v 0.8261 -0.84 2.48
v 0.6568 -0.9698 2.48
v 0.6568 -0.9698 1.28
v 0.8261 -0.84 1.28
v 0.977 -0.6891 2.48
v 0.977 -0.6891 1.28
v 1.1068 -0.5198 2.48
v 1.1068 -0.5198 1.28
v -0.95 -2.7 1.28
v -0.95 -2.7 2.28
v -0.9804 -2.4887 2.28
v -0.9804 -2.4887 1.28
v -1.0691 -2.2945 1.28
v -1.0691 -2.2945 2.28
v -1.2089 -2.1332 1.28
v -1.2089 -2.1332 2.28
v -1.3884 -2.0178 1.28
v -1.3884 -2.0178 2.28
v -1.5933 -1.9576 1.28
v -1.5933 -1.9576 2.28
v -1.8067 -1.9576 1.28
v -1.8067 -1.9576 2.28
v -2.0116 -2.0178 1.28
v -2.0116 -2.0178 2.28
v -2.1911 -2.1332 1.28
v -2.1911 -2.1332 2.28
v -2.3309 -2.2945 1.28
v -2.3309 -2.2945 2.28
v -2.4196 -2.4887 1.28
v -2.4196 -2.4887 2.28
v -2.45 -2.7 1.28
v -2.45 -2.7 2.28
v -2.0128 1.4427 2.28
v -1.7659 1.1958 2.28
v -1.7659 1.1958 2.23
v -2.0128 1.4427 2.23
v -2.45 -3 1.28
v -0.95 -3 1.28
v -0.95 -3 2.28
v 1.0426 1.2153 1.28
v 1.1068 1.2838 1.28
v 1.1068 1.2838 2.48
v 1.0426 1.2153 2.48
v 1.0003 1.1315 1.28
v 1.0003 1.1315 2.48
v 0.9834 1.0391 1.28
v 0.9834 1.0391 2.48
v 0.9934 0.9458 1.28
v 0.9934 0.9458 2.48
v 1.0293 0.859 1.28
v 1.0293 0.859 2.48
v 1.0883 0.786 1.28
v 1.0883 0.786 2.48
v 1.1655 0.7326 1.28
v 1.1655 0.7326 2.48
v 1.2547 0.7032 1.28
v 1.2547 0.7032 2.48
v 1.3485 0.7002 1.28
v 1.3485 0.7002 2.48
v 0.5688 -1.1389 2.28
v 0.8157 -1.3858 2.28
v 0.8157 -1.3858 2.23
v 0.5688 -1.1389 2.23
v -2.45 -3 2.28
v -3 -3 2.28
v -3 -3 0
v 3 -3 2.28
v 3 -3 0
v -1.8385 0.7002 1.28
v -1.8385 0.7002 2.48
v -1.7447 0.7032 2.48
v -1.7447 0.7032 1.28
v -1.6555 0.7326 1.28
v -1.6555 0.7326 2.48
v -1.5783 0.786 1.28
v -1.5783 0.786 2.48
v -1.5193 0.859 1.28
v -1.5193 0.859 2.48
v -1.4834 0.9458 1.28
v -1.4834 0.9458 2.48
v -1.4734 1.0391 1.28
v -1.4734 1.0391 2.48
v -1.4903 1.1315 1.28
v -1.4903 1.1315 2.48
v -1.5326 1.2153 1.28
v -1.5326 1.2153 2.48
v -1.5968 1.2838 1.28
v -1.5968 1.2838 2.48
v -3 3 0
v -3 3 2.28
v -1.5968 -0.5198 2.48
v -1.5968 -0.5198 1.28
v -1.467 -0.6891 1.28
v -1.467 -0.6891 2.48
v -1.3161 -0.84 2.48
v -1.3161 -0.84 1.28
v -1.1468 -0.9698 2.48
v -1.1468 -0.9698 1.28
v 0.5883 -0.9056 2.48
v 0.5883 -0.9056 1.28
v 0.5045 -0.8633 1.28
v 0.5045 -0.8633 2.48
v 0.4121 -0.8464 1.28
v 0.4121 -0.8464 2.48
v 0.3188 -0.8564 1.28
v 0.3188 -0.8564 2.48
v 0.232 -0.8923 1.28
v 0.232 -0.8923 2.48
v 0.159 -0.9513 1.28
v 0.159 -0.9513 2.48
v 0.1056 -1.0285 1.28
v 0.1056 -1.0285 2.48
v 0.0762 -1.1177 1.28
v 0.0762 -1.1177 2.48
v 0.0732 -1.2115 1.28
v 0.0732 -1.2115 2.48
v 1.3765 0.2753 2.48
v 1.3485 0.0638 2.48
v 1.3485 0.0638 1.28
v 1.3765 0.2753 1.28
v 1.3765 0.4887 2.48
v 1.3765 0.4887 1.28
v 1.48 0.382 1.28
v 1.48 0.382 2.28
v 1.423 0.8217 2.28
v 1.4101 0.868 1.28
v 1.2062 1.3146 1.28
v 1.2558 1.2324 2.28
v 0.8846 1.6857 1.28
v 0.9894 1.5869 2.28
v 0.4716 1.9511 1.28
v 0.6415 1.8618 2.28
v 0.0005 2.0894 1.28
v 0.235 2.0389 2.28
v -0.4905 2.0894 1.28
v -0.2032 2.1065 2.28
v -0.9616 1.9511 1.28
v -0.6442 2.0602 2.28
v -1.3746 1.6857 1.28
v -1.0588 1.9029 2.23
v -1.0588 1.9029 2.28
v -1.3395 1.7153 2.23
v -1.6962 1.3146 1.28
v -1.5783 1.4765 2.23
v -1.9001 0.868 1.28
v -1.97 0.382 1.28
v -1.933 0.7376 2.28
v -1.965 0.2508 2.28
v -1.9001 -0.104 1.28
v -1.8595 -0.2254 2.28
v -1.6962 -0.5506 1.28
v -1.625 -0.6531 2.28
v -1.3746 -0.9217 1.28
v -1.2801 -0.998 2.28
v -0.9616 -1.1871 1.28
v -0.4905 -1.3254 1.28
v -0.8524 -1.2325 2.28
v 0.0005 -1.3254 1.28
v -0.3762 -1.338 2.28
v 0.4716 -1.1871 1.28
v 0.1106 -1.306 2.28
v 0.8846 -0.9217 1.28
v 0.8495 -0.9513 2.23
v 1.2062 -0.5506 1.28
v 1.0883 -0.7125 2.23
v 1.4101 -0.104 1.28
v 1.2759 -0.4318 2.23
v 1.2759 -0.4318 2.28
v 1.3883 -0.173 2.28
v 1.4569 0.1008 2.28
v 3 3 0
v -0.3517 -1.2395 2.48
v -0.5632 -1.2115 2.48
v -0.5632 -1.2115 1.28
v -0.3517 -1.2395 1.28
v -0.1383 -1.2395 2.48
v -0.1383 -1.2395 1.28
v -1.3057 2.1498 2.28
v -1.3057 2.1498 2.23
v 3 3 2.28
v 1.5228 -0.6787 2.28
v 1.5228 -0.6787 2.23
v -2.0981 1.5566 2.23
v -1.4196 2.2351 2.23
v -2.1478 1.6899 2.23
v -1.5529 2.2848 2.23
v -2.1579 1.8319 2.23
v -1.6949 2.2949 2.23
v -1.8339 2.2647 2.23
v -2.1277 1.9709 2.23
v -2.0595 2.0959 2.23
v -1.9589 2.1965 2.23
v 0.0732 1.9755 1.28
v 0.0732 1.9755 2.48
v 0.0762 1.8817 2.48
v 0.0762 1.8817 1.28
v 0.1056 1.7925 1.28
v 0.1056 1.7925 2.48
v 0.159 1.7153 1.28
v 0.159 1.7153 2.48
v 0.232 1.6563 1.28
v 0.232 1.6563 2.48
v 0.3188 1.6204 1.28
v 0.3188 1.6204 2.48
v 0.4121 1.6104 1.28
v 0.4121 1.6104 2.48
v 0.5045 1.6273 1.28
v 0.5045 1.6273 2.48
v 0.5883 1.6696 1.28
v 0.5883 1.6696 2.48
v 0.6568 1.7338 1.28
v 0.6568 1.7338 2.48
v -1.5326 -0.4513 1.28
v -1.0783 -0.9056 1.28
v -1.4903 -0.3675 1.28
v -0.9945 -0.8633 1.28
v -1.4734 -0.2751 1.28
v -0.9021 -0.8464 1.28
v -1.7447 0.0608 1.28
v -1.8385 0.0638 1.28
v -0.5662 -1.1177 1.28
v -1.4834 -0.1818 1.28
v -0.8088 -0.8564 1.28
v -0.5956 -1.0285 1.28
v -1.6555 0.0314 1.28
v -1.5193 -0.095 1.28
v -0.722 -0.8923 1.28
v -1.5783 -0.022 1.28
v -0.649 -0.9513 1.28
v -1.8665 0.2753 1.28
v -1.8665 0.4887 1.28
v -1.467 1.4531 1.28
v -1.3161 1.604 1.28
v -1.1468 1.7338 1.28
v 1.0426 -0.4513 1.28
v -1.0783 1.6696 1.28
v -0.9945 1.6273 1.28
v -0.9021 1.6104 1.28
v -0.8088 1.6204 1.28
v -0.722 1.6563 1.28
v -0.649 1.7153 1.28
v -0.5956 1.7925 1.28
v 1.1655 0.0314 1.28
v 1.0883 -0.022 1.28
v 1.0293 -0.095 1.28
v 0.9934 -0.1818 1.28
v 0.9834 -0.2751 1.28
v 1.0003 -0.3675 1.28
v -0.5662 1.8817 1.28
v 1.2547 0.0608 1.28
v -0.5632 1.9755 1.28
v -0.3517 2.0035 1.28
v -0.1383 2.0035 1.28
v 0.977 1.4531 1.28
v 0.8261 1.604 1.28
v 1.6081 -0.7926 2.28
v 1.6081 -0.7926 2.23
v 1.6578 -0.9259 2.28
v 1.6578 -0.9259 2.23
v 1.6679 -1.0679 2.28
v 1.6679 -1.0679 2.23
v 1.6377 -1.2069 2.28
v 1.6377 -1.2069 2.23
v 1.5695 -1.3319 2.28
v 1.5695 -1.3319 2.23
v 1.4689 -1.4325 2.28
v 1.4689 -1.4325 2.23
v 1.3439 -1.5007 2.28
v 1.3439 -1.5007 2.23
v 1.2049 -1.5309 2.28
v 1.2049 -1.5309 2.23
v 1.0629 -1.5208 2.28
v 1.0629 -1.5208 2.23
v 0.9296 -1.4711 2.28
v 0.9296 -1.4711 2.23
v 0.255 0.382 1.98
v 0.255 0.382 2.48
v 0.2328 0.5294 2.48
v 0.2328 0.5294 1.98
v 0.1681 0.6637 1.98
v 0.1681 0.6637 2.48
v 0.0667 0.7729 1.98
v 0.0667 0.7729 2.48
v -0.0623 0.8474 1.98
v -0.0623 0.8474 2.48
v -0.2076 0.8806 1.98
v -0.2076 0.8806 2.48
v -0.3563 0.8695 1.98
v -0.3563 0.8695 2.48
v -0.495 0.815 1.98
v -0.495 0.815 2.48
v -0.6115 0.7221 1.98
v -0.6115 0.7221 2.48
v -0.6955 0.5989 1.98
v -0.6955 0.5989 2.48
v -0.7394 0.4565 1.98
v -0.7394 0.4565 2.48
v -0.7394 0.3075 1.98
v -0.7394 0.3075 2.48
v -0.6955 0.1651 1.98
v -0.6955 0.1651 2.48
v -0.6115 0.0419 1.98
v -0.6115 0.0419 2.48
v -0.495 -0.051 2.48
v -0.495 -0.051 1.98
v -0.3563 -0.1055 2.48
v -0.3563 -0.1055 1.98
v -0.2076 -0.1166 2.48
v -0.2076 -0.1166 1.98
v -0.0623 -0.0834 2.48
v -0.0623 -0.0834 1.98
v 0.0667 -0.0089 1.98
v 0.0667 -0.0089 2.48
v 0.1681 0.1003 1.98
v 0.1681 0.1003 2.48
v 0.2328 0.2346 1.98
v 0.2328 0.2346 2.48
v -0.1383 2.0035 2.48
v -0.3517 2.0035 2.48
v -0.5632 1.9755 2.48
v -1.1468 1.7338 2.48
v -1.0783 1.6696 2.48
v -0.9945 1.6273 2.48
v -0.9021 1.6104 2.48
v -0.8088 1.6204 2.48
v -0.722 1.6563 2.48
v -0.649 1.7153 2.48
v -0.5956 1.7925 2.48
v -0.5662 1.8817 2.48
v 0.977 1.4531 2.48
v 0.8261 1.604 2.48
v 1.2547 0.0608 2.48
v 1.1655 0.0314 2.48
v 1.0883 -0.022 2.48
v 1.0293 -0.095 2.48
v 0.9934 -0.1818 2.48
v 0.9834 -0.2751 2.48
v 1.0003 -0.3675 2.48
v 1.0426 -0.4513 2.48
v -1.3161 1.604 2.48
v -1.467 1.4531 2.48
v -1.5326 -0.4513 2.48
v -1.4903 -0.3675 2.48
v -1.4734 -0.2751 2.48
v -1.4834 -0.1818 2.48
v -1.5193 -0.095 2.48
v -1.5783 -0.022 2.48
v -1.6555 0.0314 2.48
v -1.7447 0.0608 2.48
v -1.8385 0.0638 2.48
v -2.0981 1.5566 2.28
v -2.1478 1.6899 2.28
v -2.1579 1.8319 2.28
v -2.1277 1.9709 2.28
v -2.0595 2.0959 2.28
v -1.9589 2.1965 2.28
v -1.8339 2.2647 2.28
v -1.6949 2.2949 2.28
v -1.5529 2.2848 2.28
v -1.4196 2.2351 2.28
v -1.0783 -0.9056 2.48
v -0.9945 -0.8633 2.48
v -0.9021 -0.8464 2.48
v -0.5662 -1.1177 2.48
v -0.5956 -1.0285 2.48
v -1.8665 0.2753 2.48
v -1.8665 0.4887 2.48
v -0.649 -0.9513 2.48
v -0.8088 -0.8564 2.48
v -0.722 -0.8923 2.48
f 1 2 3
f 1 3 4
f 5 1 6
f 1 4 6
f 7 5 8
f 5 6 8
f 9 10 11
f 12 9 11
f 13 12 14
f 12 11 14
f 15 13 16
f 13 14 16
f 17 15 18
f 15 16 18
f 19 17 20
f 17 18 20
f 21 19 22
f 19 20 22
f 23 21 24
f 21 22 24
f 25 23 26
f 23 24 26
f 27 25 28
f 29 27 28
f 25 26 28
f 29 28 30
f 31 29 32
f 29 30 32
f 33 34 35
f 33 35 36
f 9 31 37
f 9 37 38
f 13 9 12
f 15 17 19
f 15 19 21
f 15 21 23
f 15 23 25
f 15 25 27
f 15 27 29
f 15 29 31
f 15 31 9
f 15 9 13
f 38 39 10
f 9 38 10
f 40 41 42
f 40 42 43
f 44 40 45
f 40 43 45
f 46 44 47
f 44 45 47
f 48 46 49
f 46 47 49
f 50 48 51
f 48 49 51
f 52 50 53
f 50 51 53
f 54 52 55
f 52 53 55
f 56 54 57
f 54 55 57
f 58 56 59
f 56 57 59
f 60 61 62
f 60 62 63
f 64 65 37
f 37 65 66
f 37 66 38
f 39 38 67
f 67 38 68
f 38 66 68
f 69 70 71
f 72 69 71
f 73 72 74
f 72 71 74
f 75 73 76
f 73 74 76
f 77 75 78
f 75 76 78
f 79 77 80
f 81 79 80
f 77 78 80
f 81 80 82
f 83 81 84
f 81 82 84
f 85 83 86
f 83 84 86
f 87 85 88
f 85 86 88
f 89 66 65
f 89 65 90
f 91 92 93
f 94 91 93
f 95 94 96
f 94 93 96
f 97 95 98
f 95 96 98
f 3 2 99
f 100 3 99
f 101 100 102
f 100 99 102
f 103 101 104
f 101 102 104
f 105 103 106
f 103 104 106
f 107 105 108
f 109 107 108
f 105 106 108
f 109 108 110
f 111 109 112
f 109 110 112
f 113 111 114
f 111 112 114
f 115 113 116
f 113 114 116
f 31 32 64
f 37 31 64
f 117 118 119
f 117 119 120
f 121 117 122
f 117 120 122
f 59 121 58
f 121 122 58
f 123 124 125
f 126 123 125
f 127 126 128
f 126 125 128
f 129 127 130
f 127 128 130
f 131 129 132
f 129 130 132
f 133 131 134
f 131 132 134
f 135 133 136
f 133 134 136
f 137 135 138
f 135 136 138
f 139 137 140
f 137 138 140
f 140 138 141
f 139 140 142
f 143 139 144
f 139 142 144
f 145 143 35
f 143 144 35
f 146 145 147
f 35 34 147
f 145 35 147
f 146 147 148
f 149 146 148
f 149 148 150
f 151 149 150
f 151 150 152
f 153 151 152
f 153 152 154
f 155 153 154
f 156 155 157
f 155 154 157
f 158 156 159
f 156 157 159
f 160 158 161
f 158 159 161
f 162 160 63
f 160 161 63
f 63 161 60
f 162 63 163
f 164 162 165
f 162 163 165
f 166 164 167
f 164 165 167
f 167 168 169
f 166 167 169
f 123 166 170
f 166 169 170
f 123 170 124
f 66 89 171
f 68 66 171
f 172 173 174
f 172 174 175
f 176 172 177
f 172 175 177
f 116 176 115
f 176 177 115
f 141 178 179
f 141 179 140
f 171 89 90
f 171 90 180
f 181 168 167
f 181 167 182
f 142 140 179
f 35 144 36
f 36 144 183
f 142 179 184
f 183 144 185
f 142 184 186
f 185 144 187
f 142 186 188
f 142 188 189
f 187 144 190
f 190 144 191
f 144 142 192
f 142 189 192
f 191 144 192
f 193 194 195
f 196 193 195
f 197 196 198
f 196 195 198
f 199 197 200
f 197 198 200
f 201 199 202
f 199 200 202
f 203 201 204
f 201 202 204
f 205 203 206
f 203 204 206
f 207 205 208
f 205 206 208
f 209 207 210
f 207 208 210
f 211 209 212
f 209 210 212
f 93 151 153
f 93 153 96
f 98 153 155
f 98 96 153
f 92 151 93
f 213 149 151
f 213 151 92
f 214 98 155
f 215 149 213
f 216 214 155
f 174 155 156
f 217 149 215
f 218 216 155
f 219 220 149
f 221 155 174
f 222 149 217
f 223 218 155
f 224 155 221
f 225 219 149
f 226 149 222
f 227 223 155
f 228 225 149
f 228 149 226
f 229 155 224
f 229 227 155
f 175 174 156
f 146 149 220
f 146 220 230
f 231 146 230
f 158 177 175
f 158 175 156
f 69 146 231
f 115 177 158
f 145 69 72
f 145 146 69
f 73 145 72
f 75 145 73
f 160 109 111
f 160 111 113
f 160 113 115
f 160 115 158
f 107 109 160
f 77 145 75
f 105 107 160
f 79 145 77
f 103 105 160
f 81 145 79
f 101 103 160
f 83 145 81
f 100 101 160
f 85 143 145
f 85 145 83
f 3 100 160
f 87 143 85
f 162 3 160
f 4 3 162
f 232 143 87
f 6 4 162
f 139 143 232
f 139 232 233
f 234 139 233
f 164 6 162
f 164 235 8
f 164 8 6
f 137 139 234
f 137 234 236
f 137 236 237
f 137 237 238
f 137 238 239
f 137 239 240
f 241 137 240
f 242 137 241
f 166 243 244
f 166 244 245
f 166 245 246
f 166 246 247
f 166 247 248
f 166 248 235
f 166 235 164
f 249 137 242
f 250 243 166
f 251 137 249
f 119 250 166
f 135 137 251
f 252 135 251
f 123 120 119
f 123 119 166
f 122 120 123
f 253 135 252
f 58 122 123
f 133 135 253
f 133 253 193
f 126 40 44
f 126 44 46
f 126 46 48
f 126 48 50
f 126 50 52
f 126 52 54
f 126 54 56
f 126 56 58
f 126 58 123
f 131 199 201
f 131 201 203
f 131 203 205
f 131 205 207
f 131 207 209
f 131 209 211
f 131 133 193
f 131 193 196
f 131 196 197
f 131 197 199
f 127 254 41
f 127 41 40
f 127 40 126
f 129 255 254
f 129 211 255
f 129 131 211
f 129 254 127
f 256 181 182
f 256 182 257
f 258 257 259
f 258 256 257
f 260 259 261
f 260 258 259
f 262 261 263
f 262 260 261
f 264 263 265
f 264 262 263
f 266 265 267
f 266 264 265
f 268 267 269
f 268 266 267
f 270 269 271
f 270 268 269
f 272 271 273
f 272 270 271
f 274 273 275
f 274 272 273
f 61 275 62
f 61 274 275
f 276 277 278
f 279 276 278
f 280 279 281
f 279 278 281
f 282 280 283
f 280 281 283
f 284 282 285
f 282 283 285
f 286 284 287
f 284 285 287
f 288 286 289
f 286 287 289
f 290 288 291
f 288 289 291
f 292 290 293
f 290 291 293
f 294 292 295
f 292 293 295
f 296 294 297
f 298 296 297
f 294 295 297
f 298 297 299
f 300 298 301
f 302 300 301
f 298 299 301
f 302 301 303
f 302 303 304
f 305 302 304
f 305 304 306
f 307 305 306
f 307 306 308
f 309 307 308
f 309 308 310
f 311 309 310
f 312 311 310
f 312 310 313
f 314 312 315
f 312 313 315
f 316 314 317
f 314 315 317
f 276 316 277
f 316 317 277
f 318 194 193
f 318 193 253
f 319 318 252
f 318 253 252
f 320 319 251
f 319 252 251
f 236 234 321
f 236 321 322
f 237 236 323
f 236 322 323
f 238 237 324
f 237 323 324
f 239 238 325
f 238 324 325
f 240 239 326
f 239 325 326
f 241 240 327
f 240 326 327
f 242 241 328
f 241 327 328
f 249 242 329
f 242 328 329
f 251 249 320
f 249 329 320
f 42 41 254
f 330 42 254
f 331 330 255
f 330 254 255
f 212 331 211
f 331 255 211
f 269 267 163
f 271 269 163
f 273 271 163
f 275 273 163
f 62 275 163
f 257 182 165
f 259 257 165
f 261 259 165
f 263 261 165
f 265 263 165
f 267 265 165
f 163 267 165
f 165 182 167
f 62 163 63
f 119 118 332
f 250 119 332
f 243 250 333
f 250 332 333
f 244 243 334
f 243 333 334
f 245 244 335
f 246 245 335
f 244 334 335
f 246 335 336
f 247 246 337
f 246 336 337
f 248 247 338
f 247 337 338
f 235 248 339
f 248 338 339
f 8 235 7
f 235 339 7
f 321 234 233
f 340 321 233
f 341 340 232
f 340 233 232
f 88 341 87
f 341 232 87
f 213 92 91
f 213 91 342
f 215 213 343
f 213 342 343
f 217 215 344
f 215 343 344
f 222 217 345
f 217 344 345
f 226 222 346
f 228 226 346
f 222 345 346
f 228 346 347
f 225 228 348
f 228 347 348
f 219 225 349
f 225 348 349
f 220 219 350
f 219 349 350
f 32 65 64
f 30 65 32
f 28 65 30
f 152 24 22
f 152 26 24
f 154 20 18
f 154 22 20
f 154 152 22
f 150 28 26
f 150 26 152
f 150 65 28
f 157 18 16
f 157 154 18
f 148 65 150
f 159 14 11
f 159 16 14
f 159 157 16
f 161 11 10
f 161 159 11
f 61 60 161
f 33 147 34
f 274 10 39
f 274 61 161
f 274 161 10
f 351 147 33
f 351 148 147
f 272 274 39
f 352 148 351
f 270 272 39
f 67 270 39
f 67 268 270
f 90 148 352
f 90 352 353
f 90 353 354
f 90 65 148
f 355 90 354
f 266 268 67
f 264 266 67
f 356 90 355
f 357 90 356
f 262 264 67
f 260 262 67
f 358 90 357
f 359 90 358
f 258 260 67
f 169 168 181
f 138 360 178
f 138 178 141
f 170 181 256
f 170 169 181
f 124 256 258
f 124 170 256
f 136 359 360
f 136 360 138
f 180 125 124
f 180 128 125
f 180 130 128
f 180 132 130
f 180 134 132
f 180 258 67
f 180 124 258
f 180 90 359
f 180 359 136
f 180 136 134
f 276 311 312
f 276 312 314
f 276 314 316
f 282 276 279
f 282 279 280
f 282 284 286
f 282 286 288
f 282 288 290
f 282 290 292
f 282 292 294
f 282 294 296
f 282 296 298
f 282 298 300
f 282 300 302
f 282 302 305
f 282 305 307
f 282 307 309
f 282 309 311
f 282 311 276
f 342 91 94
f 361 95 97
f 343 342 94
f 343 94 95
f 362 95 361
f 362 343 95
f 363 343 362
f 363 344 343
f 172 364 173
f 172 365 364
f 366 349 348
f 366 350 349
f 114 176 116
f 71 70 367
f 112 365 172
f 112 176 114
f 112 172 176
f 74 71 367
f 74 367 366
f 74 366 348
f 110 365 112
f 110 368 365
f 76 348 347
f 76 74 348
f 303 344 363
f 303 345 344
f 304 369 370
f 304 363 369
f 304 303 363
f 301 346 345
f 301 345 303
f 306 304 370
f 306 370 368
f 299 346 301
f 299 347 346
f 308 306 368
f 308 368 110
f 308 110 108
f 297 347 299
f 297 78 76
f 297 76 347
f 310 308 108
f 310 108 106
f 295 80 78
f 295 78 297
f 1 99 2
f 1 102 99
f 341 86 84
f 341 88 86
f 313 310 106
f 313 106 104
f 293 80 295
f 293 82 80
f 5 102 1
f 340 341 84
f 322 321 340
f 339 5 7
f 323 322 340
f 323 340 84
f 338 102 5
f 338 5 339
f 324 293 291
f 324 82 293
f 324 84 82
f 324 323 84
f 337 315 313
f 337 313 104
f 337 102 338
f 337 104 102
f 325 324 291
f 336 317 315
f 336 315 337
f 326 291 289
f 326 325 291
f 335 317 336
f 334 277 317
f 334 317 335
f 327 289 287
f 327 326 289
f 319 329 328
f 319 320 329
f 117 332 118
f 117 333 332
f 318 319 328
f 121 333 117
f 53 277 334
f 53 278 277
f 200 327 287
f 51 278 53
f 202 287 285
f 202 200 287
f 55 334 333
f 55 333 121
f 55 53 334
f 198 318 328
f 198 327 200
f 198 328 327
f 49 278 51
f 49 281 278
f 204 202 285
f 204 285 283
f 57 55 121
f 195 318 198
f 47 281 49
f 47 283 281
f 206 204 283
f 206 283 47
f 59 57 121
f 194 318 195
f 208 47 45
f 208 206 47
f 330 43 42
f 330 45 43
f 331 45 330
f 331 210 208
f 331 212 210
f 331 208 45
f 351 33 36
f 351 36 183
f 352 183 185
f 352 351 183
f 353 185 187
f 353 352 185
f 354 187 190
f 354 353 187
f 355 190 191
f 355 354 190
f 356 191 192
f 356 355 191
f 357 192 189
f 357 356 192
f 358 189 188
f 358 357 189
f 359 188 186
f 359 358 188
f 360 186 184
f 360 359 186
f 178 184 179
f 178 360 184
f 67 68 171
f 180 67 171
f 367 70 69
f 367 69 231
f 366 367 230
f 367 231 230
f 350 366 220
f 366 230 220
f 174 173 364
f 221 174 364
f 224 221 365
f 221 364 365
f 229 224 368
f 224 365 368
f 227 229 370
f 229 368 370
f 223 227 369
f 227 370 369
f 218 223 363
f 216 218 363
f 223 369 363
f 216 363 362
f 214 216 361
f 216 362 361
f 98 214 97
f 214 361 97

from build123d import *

# Parameters (mm, degrees)
SKETCH1_W           = 6
SKETCH1_H           = 6
BOSS_EXTRUDE1_DEPTH = 2.28
SKETCH2_R           = 1.725
CUT_EXTRUDE1_DEPTH  = 1
CUT_EXTRUDE2_DEPTH  = 0.05
CUT_EXTRUDE3_DEPTH  = 1
SKETCH5_R           = 1.625
BOSS_EXTRUDE2_DEPTH = 1.2
CUT_EXTRUDE6_DEPTH  = 1.2
SKETCH7_R           = 0.5
CUT_EXTRUDE7_DEPTH  = 0.5


with BuildPart() as part:
    # Sketch1 → Boss-Extrude1 (new body)
    with BuildSketch(Plane.XY):
        Rectangle(SKETCH1_W, SKETCH1_H)
    extrude(amount=BOSS_EXTRUDE1_DEPTH)

    # Sketch2 → Cut-Extrude1 (cut)
    with BuildSketch(Plane.XY.offset(2.28)):
        with Locations((-0.245, 0.382)):
            Circle(SKETCH2_R)
    extrude(amount=-CUT_EXTRUDE1_DEPTH, mode=Mode.SUBTRACT)

    # Sketch3 → Cut-Extrude2 (cut)
    with BuildSketch(Plane.XY.offset(2.28)):
        with BuildLine():
            Line((0.815660172, -1.385766953), (-2.012766953, 1.442660172))
            ThreePointArc((-2.012766953, 1.442660172), (-2.012766953, 2.149766953), (-1.305660172, 2.149766953))
            Line((-1.305660172, 2.149766953), (1.522766953, -0.678660172))
            ThreePointArc((1.522766953, -0.678660172), (1.522766953, -1.385766953), (0.815660172, -1.385766953))
        make_face()
    extrude(amount=-CUT_EXTRUDE2_DEPTH, mode=Mode.SUBTRACT)

    # Sketch4 → Cut-Extrude3 (cut)
    with BuildSketch(Plane.XY.offset(2.28)):
        with BuildLine():
            Line((-2.45, -2.7), (-2.45, -3))
            Line((-2.45, -3), (-0.95, -3))
            Line((-0.95, -3), (-0.95, -2.7))
            ThreePointArc((-0.95, -2.7), (-1.7, -1.95), (-2.45, -2.7))
        make_face()
    extrude(amount=-CUT_EXTRUDE3_DEPTH, mode=Mode.SUBTRACT)

    # Sketch5 → Boss-Extrude2 (add)
    with BuildSketch(Plane.XY.offset(1.28)):
        with Locations((-0.245, 0.382)):
            Circle(SKETCH5_R)
    extrude(amount=BOSS_EXTRUDE2_DEPTH)

    # Sketch6 → Cut-Extrude6 (cut)
    with BuildSketch(Plane.XY.offset(2.48)):
        with BuildLine():
            ThreePointArc((-1.897587238, 0.051650147), (-1.801997597, -0.262929521), (-1.647148264, -0.552963022))
            ThreePointArc((-1.647148264, -0.552963022), (-1.498242435, -0.137110013), (-1.897587238, 0.051650147))
        make_face()
        with BuildLine():
            ThreePointArc((0.085349853, 2.034587238), (0.274110013, 1.635242435), (0.689963022, 1.784148264))
            ThreePointArc((0.689963022, 1.784148264), (0.399929521, 1.938997597), (0.085349853, 2.034587238))
        make_face()
        with BuildLine():
            ThreePointArc((1.157148264, 1.316963022), (1.008242435, 0.901110013), (1.407587238, 0.712349853))
            ThreePointArc((1.407587238, 0.712349853), (1.311997597, 1.026929521), (1.157148264, 1.316963022))
        make_face()
        with BuildLine():
            ThreePointArc((1.407587238, 0.051650147), (1.008242435, -0.137110013), (1.157148264, -0.552963022))
            ThreePointArc((1.157148264, -0.552963022), (1.311997597, -0.262929521), (1.407587238, 0.051650147))
        make_face()
        with BuildLine():
            ThreePointArc((0.689963022, -1.020148264), (0.274110013, -0.871242435), (0.085349853, -1.270587238))
            ThreePointArc((0.085349853, -1.270587238), (0.399929521, -1.174997597), (0.689963022, -1.020148264))
        make_face()
        with BuildLine():
            ThreePointArc((-0.575349853, -1.270587238), (-0.764110013, -0.871242435), (-1.179963022, -1.020148264))
            ThreePointArc((-1.179963022, -1.020148264), (-0.889929521, -1.174997597), (-0.575349853, -1.270587238))
        make_face()
        with BuildLine():
            ThreePointArc((-1.897587238, 0.712349853), (-1.498242435, 0.901110013), (-1.647148264, 1.316963022))
            ThreePointArc((-1.647148264, 1.316963022), (-1.801997597, 1.026929521), (-1.897587238, 0.712349853))
        make_face()
        with BuildLine():
            ThreePointArc((-1.179963022, 1.784148264), (-0.764110013, 1.635242435), (-0.575349853, 2.034587238))
            ThreePointArc((-0.575349853, 2.034587238), (-0.889929521, 1.938997597), (-1.179963022, 1.784148264))
        make_face()
    extrude(amount=-CUT_EXTRUDE6_DEPTH, mode=Mode.SUBTRACT)

    # Sketch7 → Cut-Extrude7 (cut)
    with BuildSketch(Plane.XY.offset(2.48)):
        with Locations((-0.245, 0.382)):
            Circle(SKETCH7_R)
    extrude(amount=-CUT_EXTRUDE7_DEPTH, mode=Mode.SUBTRACT)


solid = part.part
